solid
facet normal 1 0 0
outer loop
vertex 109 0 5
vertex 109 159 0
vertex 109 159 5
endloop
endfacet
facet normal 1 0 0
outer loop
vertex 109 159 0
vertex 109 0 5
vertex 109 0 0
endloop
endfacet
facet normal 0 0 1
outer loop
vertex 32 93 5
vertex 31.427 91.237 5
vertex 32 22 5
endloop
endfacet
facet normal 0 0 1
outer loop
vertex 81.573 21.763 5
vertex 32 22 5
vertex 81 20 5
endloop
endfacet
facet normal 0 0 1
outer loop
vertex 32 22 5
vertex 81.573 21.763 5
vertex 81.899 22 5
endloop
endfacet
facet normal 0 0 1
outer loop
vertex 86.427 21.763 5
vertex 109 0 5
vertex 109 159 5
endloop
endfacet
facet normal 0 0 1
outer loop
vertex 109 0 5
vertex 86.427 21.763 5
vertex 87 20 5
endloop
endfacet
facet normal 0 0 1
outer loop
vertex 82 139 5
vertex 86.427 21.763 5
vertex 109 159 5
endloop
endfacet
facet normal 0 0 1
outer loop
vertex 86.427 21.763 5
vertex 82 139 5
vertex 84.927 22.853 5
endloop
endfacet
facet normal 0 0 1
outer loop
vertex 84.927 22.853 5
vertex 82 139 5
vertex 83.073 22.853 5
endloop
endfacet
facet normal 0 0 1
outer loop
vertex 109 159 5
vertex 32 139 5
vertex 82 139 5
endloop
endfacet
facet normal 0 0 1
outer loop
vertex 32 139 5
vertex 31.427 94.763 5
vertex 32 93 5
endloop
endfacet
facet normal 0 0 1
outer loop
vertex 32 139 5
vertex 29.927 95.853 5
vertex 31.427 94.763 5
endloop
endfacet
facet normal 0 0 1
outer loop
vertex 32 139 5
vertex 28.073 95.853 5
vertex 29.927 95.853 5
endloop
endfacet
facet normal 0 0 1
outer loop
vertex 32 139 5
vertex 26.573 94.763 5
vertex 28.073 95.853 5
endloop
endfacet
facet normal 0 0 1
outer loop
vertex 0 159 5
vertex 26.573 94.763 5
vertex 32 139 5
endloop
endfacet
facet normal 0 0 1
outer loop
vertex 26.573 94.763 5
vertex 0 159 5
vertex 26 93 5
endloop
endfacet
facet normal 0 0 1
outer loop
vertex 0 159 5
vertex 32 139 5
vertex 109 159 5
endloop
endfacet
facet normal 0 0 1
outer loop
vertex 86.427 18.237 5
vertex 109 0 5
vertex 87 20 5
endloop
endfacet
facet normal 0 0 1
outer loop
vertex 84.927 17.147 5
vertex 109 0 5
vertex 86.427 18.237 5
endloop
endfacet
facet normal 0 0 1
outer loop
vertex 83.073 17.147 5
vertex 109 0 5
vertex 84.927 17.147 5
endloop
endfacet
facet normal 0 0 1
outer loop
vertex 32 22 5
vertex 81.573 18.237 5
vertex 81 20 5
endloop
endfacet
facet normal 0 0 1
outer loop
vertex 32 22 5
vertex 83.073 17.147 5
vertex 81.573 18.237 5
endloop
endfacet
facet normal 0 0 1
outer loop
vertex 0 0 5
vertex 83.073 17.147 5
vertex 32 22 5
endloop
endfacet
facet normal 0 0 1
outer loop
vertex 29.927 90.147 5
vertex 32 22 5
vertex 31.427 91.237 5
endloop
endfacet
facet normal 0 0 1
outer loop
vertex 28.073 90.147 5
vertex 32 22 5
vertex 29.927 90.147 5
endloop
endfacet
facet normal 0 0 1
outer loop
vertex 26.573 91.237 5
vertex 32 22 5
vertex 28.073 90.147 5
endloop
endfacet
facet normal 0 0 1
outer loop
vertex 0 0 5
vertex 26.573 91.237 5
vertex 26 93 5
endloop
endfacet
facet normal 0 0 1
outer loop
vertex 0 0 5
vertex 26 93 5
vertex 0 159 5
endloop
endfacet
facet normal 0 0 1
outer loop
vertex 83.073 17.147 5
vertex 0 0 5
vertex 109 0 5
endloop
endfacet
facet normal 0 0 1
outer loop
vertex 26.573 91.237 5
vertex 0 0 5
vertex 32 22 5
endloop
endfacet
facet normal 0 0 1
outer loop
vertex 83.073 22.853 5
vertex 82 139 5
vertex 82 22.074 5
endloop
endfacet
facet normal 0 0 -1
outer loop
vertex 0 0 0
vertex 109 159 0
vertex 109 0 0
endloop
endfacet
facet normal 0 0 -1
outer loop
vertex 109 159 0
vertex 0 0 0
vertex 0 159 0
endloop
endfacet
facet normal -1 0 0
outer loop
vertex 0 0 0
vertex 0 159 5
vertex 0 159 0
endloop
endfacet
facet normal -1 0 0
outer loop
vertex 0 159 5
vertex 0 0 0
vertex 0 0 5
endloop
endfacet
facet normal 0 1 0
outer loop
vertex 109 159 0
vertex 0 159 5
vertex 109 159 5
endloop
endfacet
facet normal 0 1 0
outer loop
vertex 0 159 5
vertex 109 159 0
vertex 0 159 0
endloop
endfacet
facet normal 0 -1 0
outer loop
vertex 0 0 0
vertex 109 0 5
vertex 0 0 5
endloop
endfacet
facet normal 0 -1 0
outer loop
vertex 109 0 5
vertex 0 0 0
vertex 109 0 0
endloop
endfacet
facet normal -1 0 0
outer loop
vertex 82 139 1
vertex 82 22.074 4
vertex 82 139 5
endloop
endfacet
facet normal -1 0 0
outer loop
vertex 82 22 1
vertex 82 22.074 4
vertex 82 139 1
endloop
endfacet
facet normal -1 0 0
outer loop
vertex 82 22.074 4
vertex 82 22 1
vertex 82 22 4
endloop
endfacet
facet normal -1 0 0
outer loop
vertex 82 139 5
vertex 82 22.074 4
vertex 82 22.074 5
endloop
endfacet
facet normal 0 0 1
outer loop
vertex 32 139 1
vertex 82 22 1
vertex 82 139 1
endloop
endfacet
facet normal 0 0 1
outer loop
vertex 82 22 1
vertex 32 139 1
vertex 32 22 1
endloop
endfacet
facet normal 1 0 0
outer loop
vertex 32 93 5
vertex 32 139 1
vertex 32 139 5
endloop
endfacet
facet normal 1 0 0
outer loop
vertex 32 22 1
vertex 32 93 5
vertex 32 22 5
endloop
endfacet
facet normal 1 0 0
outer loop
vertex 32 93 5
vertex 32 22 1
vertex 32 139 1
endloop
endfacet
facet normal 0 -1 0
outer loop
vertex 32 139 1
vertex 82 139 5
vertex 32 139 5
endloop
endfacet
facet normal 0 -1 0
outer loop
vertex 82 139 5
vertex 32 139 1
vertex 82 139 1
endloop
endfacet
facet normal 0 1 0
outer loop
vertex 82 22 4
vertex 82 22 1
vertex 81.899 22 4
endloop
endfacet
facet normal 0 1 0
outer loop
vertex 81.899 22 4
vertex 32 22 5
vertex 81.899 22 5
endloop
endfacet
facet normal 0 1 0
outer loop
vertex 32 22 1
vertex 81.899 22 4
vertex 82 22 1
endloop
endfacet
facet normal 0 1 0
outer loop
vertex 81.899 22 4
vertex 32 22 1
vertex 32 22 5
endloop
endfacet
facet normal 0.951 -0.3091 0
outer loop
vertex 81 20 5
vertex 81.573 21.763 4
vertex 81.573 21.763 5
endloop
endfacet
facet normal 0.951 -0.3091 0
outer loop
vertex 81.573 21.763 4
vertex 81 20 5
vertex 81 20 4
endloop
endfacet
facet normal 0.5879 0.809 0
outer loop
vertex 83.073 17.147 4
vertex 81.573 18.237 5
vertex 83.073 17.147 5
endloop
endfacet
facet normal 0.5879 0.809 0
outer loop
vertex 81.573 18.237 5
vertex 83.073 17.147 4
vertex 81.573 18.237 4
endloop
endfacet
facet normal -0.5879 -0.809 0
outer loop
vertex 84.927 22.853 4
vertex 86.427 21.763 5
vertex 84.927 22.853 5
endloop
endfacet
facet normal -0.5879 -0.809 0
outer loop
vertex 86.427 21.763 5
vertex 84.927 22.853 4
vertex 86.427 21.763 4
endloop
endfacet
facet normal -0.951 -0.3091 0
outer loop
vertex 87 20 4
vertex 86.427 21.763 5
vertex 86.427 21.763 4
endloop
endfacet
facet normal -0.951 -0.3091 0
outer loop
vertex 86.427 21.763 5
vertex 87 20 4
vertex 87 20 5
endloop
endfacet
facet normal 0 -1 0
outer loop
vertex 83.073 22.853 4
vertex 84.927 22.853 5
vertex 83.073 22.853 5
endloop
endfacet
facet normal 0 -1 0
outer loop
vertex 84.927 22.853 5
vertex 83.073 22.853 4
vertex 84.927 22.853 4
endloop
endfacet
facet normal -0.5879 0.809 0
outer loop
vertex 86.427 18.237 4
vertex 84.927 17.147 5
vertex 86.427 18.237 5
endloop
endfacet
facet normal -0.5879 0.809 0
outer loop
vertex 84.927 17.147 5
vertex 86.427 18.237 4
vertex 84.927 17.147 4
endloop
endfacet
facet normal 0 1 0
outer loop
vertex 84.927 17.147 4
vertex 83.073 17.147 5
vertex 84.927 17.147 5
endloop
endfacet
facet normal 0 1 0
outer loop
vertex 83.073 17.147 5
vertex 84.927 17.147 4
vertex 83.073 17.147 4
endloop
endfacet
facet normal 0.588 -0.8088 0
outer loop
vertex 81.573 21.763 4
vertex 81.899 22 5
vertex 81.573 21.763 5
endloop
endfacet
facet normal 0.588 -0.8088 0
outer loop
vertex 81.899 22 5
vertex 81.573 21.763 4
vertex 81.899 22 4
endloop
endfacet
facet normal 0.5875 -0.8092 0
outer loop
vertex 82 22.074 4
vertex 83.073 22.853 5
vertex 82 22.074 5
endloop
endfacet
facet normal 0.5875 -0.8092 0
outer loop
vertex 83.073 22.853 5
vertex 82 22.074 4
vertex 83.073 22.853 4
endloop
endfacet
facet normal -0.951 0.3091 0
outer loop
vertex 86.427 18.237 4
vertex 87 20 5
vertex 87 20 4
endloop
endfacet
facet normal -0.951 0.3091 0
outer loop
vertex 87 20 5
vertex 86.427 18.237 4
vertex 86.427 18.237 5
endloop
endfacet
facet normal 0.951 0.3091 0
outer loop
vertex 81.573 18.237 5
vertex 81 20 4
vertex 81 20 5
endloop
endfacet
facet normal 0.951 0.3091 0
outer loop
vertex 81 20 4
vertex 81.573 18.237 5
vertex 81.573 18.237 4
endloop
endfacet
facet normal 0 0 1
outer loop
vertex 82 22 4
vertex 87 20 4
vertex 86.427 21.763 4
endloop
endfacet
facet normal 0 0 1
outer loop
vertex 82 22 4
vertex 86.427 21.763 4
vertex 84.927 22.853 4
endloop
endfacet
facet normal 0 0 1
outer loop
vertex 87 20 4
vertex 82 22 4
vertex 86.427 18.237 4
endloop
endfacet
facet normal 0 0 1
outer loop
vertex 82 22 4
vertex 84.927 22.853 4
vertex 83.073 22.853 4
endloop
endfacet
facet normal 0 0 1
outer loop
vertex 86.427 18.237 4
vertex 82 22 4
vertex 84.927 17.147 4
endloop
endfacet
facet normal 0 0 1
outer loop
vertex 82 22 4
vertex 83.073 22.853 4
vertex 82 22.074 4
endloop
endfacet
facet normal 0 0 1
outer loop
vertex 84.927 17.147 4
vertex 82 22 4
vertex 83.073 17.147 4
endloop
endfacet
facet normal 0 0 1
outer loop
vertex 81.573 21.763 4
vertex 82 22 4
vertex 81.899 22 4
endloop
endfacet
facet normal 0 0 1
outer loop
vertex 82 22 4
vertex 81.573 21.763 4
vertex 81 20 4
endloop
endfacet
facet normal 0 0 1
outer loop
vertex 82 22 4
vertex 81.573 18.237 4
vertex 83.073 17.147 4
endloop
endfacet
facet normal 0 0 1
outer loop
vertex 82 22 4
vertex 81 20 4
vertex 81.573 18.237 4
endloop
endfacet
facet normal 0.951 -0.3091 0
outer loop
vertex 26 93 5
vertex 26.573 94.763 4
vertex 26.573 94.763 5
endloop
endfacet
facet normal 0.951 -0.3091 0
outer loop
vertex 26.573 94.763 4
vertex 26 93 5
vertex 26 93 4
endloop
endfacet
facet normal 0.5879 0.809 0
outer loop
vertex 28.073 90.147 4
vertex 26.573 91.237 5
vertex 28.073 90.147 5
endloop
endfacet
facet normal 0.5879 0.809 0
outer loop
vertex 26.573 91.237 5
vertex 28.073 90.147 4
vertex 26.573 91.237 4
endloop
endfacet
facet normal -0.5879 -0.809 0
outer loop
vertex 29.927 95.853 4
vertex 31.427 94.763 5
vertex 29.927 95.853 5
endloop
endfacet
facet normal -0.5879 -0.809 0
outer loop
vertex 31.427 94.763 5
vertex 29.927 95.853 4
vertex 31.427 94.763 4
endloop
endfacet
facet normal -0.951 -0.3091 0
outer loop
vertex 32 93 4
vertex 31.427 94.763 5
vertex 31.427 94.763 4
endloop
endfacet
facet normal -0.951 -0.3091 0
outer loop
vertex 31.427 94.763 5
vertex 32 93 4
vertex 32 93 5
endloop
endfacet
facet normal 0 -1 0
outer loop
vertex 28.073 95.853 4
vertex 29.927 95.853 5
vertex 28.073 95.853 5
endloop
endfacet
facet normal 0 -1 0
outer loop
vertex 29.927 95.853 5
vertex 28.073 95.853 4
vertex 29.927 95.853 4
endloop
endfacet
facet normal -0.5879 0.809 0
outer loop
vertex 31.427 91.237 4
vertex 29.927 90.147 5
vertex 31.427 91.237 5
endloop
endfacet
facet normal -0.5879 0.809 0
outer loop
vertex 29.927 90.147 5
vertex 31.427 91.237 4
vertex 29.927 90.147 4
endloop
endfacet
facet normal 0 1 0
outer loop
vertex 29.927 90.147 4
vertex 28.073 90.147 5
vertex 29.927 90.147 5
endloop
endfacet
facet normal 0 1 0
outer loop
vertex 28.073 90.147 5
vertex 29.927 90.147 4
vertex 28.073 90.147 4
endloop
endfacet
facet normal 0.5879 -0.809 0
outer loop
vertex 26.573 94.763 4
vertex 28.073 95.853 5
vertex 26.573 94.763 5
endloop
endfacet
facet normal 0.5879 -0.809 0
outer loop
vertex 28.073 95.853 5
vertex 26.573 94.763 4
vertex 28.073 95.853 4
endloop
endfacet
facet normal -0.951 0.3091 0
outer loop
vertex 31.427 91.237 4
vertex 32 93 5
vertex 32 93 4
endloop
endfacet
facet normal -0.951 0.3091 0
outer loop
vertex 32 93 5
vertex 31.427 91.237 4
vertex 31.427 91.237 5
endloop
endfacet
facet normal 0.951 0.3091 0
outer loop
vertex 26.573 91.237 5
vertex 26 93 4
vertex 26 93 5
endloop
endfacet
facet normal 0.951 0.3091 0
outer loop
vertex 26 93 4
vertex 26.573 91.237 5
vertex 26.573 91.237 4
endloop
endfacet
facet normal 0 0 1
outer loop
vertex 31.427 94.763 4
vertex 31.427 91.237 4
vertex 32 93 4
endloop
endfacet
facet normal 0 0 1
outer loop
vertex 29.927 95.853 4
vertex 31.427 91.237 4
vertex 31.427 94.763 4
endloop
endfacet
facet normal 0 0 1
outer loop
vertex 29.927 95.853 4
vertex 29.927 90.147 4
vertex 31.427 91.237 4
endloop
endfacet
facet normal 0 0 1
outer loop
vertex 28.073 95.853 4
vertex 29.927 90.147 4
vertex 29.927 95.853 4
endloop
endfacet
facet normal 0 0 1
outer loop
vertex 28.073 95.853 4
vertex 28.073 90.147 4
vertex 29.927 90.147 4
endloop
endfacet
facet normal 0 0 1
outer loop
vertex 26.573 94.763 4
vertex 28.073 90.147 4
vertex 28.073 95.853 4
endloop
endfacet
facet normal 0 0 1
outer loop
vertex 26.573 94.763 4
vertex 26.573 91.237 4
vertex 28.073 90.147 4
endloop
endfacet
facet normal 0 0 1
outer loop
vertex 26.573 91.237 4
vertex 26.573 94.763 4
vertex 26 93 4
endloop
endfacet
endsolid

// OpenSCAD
//$fn=360;
//67x93x22
x=109;
y=159;
z=5;
magnetdia=6;
//square([x+4,y+4]);
difference() {
    translate([0,0,0])
    cube([x,y,z]);
    translate([32,22,1])
    cube([50,117,4]);
    //translate([5,0,15])
    //cube([x-8,y,z-20]);
    translate([84,20,z-1])
    cylinder(h=1,d=magnetdia);
    translate([29,93,z-1])
    cylinder(h=1,d=magnetdia);
}
